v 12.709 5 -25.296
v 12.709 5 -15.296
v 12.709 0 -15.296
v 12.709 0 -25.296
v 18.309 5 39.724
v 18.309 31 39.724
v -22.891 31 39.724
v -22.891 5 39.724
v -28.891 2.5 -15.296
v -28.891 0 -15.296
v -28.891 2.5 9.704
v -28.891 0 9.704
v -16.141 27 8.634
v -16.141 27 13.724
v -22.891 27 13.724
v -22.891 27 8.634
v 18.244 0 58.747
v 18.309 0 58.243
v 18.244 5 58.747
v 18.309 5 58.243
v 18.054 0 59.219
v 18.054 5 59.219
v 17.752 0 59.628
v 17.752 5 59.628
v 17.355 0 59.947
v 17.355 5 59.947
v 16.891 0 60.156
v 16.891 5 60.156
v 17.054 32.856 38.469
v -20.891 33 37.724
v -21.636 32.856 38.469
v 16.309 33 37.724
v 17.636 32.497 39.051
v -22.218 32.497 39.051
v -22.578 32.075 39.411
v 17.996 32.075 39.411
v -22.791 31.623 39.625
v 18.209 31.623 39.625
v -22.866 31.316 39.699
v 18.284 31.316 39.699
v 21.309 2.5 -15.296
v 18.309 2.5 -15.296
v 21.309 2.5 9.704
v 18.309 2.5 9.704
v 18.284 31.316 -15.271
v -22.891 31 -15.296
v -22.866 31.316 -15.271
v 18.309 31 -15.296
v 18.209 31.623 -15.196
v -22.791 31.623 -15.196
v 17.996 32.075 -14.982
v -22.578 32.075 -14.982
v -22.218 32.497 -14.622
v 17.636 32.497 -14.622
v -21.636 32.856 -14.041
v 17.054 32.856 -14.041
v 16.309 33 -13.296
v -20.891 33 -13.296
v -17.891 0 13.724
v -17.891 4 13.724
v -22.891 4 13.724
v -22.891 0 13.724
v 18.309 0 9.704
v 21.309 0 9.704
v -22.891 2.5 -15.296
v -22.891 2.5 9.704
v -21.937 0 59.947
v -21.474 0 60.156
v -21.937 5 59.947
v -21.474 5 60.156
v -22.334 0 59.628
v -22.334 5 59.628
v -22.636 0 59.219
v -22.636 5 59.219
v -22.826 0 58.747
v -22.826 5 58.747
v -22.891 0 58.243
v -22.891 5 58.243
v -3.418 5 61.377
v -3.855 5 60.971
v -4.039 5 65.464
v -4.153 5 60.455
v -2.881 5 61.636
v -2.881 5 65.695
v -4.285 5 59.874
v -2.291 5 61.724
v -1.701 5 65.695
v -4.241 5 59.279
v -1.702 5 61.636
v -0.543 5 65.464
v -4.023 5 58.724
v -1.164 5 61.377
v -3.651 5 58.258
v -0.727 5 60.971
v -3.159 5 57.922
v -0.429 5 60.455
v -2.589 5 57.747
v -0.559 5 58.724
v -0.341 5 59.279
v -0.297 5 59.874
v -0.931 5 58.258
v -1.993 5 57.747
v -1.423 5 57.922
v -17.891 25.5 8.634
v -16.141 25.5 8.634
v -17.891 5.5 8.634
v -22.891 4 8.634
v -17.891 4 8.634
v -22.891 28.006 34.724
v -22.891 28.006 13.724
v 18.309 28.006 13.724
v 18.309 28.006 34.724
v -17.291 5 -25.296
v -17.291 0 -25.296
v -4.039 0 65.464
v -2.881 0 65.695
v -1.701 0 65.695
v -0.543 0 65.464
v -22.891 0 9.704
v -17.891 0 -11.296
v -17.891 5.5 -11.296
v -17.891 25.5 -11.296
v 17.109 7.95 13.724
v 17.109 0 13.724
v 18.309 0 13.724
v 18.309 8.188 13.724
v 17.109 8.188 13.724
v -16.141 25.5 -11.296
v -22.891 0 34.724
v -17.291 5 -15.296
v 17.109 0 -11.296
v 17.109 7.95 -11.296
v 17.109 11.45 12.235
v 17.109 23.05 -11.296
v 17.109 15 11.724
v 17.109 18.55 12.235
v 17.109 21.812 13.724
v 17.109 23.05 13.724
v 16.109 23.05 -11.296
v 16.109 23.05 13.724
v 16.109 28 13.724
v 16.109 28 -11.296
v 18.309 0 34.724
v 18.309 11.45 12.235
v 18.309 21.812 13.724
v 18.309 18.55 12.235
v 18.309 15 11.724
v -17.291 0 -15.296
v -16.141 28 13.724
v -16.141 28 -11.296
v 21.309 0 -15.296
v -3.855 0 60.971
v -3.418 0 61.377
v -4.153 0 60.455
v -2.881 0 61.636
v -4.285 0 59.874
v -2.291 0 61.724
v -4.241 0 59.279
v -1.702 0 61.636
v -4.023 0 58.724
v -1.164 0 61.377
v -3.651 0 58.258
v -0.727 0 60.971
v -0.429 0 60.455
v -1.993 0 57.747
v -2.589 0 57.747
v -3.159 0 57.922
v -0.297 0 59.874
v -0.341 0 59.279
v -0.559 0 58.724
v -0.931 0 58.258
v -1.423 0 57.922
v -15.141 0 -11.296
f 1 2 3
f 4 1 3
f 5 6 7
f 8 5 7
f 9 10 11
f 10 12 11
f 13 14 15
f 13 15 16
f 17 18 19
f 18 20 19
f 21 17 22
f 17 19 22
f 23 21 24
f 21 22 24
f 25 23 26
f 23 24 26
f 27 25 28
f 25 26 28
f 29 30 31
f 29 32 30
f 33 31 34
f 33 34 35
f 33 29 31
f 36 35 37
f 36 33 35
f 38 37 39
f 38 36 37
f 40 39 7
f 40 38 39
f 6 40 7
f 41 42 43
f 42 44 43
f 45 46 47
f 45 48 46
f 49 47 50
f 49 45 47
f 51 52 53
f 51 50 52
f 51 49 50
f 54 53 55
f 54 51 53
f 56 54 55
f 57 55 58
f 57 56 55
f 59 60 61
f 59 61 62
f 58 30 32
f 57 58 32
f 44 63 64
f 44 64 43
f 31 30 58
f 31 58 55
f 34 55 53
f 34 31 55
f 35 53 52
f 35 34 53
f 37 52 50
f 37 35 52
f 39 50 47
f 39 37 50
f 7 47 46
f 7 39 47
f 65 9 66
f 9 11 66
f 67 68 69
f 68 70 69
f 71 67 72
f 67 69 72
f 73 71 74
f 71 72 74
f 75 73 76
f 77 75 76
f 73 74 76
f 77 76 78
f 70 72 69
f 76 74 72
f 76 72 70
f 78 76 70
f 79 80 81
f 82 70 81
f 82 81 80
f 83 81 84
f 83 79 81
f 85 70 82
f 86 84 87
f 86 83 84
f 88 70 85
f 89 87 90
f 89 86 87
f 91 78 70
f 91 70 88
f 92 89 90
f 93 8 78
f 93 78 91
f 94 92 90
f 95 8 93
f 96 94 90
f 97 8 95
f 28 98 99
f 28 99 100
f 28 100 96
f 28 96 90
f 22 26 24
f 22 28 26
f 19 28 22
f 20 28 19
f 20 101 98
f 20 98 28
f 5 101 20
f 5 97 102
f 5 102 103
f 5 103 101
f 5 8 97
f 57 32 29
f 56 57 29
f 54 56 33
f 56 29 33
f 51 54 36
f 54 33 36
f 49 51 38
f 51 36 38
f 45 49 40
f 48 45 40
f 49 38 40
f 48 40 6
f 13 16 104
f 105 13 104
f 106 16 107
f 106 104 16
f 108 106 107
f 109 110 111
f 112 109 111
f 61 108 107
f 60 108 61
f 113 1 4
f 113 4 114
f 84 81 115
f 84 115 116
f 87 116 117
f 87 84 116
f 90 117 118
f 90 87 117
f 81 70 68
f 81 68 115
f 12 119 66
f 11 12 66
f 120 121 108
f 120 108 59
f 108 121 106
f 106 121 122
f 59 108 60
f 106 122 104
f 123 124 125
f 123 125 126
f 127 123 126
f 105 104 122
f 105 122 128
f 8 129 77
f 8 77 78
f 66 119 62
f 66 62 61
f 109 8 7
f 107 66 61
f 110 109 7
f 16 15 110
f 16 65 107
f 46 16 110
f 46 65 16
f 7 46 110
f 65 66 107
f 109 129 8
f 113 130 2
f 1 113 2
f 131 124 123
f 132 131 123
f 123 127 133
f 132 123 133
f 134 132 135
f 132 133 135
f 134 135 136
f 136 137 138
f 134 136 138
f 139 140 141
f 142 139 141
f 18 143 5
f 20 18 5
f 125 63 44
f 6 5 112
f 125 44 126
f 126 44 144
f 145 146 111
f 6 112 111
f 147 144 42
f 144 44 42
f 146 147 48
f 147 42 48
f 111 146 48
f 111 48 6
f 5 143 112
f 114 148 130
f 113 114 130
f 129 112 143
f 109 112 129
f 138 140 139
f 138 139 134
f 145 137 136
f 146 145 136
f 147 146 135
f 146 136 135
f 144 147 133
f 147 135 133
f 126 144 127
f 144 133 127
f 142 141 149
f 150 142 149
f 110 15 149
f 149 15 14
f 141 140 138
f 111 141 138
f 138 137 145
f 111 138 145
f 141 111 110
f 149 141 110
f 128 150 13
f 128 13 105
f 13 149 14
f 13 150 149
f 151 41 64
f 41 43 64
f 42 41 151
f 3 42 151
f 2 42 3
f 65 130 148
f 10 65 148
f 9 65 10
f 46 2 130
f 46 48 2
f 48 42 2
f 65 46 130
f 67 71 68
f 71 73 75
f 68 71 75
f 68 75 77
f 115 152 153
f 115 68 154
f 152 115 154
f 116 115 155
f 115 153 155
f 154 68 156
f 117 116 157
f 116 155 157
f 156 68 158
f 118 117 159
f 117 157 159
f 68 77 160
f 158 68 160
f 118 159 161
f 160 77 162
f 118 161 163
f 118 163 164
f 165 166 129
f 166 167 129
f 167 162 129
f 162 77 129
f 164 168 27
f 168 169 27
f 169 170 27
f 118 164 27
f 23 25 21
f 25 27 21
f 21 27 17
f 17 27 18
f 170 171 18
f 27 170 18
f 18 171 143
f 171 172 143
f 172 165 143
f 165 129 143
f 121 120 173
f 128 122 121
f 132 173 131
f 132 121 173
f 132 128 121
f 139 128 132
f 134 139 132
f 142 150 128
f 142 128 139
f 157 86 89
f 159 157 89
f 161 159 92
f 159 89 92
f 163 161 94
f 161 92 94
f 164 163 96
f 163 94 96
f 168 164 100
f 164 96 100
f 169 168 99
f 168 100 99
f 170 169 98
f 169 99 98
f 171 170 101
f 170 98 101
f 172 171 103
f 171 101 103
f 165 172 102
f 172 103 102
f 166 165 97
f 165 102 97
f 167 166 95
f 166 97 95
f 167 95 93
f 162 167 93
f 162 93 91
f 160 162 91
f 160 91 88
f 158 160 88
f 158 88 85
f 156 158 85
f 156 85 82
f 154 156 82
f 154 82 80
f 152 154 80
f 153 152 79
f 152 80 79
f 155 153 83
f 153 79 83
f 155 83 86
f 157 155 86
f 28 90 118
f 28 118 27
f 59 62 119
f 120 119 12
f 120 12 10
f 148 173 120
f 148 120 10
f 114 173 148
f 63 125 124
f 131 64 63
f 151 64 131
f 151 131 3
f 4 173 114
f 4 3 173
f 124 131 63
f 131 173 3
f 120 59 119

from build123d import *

# Parameters (mm, degrees)
SKETCH1_W            = 39
SKETCH1_H            = 49.22
BOSS_EXTRUDE2_DEPTH  = 30
SKETCH3_W            = 1.75
SKETCH3_H            = 20
SKETCH3_W_2          = 1
SKETCH3_H_2          = 15.1
CUT_EXTRUDE3_DEPTH   = 47.22
CUT_EXTRUDE4_DEPTH   = 47.22
CUT_EXTRUDE5_DEPTH   = 3.75
SKETCH9_W            = 22.2
SKETCH9_H            = 30
CUT_EXTRUDE7_DEPTH   = 61.922592565
SKETCH11_W           = 0.8
SKETCH11_H           = 21.811754546
SKETCH11_H_2         = 8.188245454
CUT_EXTRUDE8_DEPTH   = 46.008146799
SKETCH12_W           = 23
SKETCH12_H           = 2.5
BOSS_EXTRUDE3_DEPTH  = 3
SKETCH13_W           = 23
SKETCH13_H           = 2.5
BOSS_EXTRUDE4_DEPTH  = 3
BOSS_EXTRUDE5_REACH  = 51.909
SKETCH14_W           = 27.02
SKETCH14_H           = 3
SKETCH15_W           = 30.25
SKETCH15_H           = 3
CUT_EXTRUDE9_DEPTH   = 25.02
SKETCH16_W           = 30.25
SKETCH16_H           = 3
CUT_EXTRUDE10_DEPTH  = 46.276919382
SKETCH24_W           = 23
SKETCH24_H           = 2.5
BOSS_EXTRUDE8_DEPTH  = 6
BOSS_EXTRUDE9_DEPTH  = 3
SKETCH26_W           = 41.2
SKETCH26_H           = 27.02
BOSS_EXTRUDE10_DEPTH = 3
SKETCH29_W           = 4.264424859
SKETCH29_H           = 26.447816837
CUT_EXTRUDE14_DEPTH  = 41.905994632
SKETCH30_W           = 3.981396999
SKETCH30_H           = 33.655588154
CUT_EXTRUDE15_DEPTH  = 40.425282457
BOSS_EXTRUDE15_DEPTH = 2
BOSS_EXTRUDE16_DEPTH = 2
SKETCH36_W           = 41.2
SKETCH36_H           = 4.993514727
BOSS_EXTRUDE17_DEPTH = 26
SKETCH37_W           = 41.2
SKETCH37_H           = 5
BOSS_EXTRUDE18_DEPTH = 28.006485273
SKETCH38_W           = 41.2
SKETCH38_H           = 5
BOSS_EXTRUDE19_DEPTH = 20
BOSS_EXTRUDE21_DEPTH = 5
SKETCH40_R           = 2
CUT_EXTRUDE16_DEPTH  = 78.060934741
FILLET1_R            = 2
BOSS_EXTRUDE22_DEPTH = 10


with BuildPart() as part:
    # Sketch1 → Boss-Extrude2 (new body)
    with BuildSketch(Plane(origin=(0, 0, 0), x_dir=(1, 0, 0), z_dir=(0, 1, 0))):
        with Locations((-0.391025069, -11.314396792)):
            Rectangle(SKETCH1_W, SKETCH1_H)
    extrude(amount=BOSS_EXTRUDE2_DEPTH)

    # Sketch3 → Cut-Extrude3 (cut)
    with BuildSketch(Plane.XY.offset(35.924396792)):
        Polygon((16.108974931, 23.05), (16.108974931, 28), (-16.141025069, 28), (-16.141025069, 25.5), (-16.141025069, 5.5), (-16.141025069, 0), (16.108974931, 0), (16.108974931, 7.95), align=None)
        with Locations((-17.016025069, 15.5)):
            Rectangle(SKETCH3_W, SKETCH3_H)
        with Locations((16.608974931, 15.5)):
            Rectangle(SKETCH3_W_2, SKETCH3_H_2)
    extrude(amount=-CUT_EXTRUDE3_DEPTH, mode=Mode.SUBTRACT)

    # Sketch7 → Cut-Extrude4 (cut)
    with BuildSketch(Plane.ZY.offset(19.891025069)):
        with BuildLine():
            ThreePointArc((11.724396792, 15), (24.324396792, 2.4), (36.924396792, 15))
            ThreePointArc((36.924396792, 15), (24.324396792, 27.6), (11.724396792, 15))
        make_face()
    extrude(amount=-CUT_EXTRUDE4_DEPTH, mode=Mode.SUBTRACT)

    # Sketch8 → Cut-Extrude5 (cut)
    with BuildSketch(Plane.ZY.offset(19.891025069)):
        with BuildLine():
            Line((35.924396792, 30), (17.633933867, 30))
            Line((17.633933867, 30), (17.633933867, 27))
            Line((17.633933867, 27), (8.633933867, 27))
            Line((8.633933867, 27), (8.633933867, 4))
            Line((8.633933867, 4), (17.633933867, 4))
            Line((17.633933867, 4), (17.633933867, 0))
            Line((17.633933867, 0), (35.924396792, 0))
            Line((35.924396792, 0), (35.924396792, 10.08065045))
            ThreePointArc((35.924396792, 10.08065045), (11.724396792, 15), (35.924396792, 19.91934955))
            Line((35.924396792, 19.91934955), (35.924396792, 30))
        make_face()
    extrude(amount=-CUT_EXTRUDE5_DEPTH, mode=Mode.SUBTRACT)

    # Sketch9 → Cut-Extrude7 (cut, through all)
    with BuildSketch(Plane(origin=(19.108974931, 0, 0), x_dir=(0, 0, -1), z_dir=(1, 0, 0))):
        with Locations((-24.824396792, 15)):
            Rectangle(SKETCH9_W, SKETCH9_H)
    extrude(amount=-CUT_EXTRUDE7_DEPTH, mode=Mode.SUBTRACT)

    # Sketch11 → Cut-Extrude8 (cut, through all)
    with BuildSketch(Plane.XY.offset(13.724396792)):
        with Locations((18.708974931, 19.094122727)):
            Rectangle(SKETCH11_W, SKETCH11_H)
        with Locations((18.708974931, 4.094122727)):
            Rectangle(SKETCH11_W, SKETCH11_H_2)
    extrude(amount=-CUT_EXTRUDE8_DEPTH, mode=Mode.SUBTRACT)

    # Sketch12 → Boss-Extrude3 (add)
    with BuildSketch(Plane(origin=(18.308974931, 0, 0), x_dir=(0, 0, -1), z_dir=(1, 0, 0))):
        with Locations((1.795603208, 1.25)):
            Rectangle(SKETCH12_W, SKETCH12_H)
    extrude(amount=BOSS_EXTRUDE3_DEPTH)

    # Sketch13 → Boss-Extrude4 (add)
    with BuildSketch(Plane.ZY.offset(19.891025069)):
        with Locations((-1.795603208, 1.25)):
            Rectangle(SKETCH13_W, SKETCH13_H)
    extrude(amount=BOSS_EXTRUDE4_DEPTH)

    # Sketch14 → Boss-Extrude5 (add, up to next)
    with BuildSketch(Plane(origin=(-16.141025069, 0, 0), x_dir=(0, 0, -1), z_dir=(1, 0, 0)), mode=Mode.PRIVATE) as boss_extrude5_sk1:
        with Locations((-0.214396792, 1.5)):
            Rectangle(SKETCH14_W, SKETCH14_H)
    boss_extrude5_tool1 = extrude(boss_extrude5_sk1.sketch, amount=BOSS_EXTRUDE5_REACH, mode=Mode.PRIVATE) - part.part
    add(boss_extrude5_tool1.solids().sort_by_distance((-16.141025, 1.5, 0.214397))[0])

    # Sketch15 → Cut-Extrude9 (cut)
    with BuildSketch(Plane.XY.offset(13.724396792)):
        with Locations((-0.016025069, 1.5)):
            Rectangle(SKETCH15_W, SKETCH15_H)
    extrude(amount=-CUT_EXTRUDE9_DEPTH, mode=Mode.SUBTRACT)

    # Sketch16 → Cut-Extrude10 (cut, through all)
    with BuildSketch(Plane.XY.offset(-11.295603208)):
        with Locations((-0.016025069, 1.5)):
            Rectangle(SKETCH16_W, SKETCH16_H)
    extrude(amount=-CUT_EXTRUDE10_DEPTH, mode=Mode.SUBTRACT)

    # Sketch24 → Boss-Extrude8 (add)
    with BuildSketch(Plane.ZY.offset(22.891025069)):
        with Locations((-1.795603208, 1.25)):
            Rectangle(SKETCH24_W, SKETCH24_H)
    extrude(amount=BOSS_EXTRUDE8_DEPTH)

    # Sketch25 → Boss-Extrude9 (add)
    with BuildSketch(Plane.ZY.offset(19.891025069)):
        Polygon((-13.295603208, 30), (13.724396792, 30), (13.724396792, 27), (8.633933867, 27), (8.633933867, 4), (13.724396792, 4), (13.724396792, 0), (9.704396792, 0), (9.704396792, 2.5), (-13.295603208, 2.5), align=None)
    extrude(amount=BOSS_EXTRUDE9_DEPTH)

    # Sketch26 → Boss-Extrude10 (add)
    with BuildSketch(Plane(origin=(0, 30, 0), x_dir=(1, 0, 0), z_dir=(0, 1, 0))):
        with Locations((-2.291025069, -0.214396792)):
            Rectangle(SKETCH26_W, SKETCH26_H)
    extrude(amount=BOSS_EXTRUDE10_DEPTH)

    # Sketch29 → Cut-Extrude14 (cut, through all)
    with BuildSketch(Plane.XZ.offset(-25.5)):
        with Locations((-15.75881264, 1.92830521)):
            Rectangle(SKETCH29_W, SKETCH29_H)
    extrude(amount=CUT_EXTRUDE14_DEPTH, mode=Mode.SUBTRACT)

    # Sketch30 → Cut-Extrude15 (cut, through all)
    with BuildSketch(Plane(origin=(0, 23.05, 0), x_dir=(-1, 0, 0), z_dir=(0, -1, 0))):
        with Locations((-15.118276432, -5.532190869)):
            Rectangle(SKETCH30_W, SKETCH30_H)
    extrude(amount=CUT_EXTRUDE15_DEPTH, mode=Mode.SUBTRACT)

    # Sketch34 → Boss-Extrude15 (add)
    with BuildSketch(Plane(origin=(0, 0, -13.295603208), x_dir=(-1, 0, 0), z_dir=(0, 0, -1))):
        Polygon((-18.308974931, 33), (-18.308974931, 2.5), (-21.308974931, 2.5), (-21.308974931, 0), (28.891025069, 0), (28.891025069, 2.5), (22.891025069, 2.5), (22.891025069, 33), align=None)
    extrude(amount=-BOSS_EXTRUDE15_DEPTH)

    # Sketch35 → Boss-Extrude16 (add)
    with BuildSketch(Plane(origin=(0, 0, -13.295603208), x_dir=(-1, 0, 0), z_dir=(0, 0, -1))):
        Polygon((-18.308974931, 33), (-18.308974931, 2.5), (-21.308974931, 2.5), (-21.308974931, 0), (28.891025069, 0), (28.891025069, 2.5), (22.891025069, 2.5), (22.891025069, 33), align=None)
    extrude(amount=BOSS_EXTRUDE16_DEPTH)

    # Sketch36 → Boss-Extrude17 (add)
    with BuildSketch(Plane.XY.offset(13.724396792)):
        with Locations((-2.291025069, 30.503242637)):
            Rectangle(SKETCH36_W, SKETCH36_H)
    extrude(amount=BOSS_EXTRUDE17_DEPTH)

    # Sketch37 → Boss-Extrude18 (add)
    with BuildSketch(Plane(origin=(0, 28.006485273, 0), x_dir=(-1, 0, 0), z_dir=(0, -1, 0))):
        with Locations((2.291025069, -37.224396792)):
            Rectangle(SKETCH37_W, SKETCH37_H)
    extrude(amount=BOSS_EXTRUDE18_DEPTH)

    # Sketch38 → Boss-Extrude19 (add)
    with BuildSketch(Plane.XY.offset(39.724396792)):
        with Locations((-2.291025069, 2.5)):
            Rectangle(SKETCH38_W, SKETCH38_H)
    extrude(amount=BOSS_EXTRUDE19_DEPTH)

    # Sketch39 → Boss-Extrude21 (add)
    with BuildSketch(Plane(origin=(0, 5, 0), x_dir=(1, 0, 0), z_dir=(0, 1, 0))):
        with BuildLine():
            Line((-8.291025069, -59.724396792), (-22.891025069, -59.724396792))
            Line((-22.891025069, -59.724396792), (-4.038597885, -65.464256481))
            ThreePointArc((-4.038597885, -65.464256481), (-7.112095329, -63.296130482), (-8.291025069, -59.724396792))
        make_face()
        with BuildLine():
            ThreePointArc((-8.291025069, -59.724396792), (-7.112095329, -63.296130482), (-4.038597885, -65.464256481))
            ThreePointArc((-4.038597885, -65.464256481), (-2.291025069, -65.724396792), (-0.543452254, -65.464256481))
            ThreePointArc((-0.543452254, -65.464256481), (2.53004519, -63.296130482), (3.708974931, -59.724396792))
            Line((3.708974931, -59.724396792), (-0.291025069, -59.724396792))
            ThreePointArc((-0.291025069, -59.724396792), (-2.291025069, -61.724396792), (-4.291025069, -59.724396792))
            Line((-4.291025069, -59.724396792), (-8.291025069, -59.724396792))
        make_face()
        with BuildLine():
            ThreePointArc((3.708974931, -59.724396792), (-2.291025069, -53.724396792), (-8.291025069, -59.724396792))
            Line((-8.291025069, -59.724396792), (-4.291025069, -59.724396792))
            ThreePointArc((-4.291025069, -59.724396792), (-2.291025069, -57.724396792), (-0.291025069, -59.724396792))
            Line((-0.291025069, -59.724396792), (3.708974931, -59.724396792))
        make_face()
        with BuildLine():
            ThreePointArc((3.708974931, -59.724396792), (2.53004519, -63.296130482), (-0.543452254, -65.464256481))
            Line((-0.543452254, -65.464256481), (18.308974931, -59.724396792))
            Line((18.308974931, -59.724396792), (3.708974931, -59.724396792))
        make_face()
    extrude(amount=-BOSS_EXTRUDE21_DEPTH)

    # Sketch40 → Cut-Extrude16 (cut, through all)
    with BuildSketch(Plane(origin=(0, 5, 0), x_dir=(1, 0, 0), z_dir=(0, 1, 0))):
        with Locations(Location((-2.291025069, -59.724396792, 0), (0, 0, 270))):
            Circle(SKETCH40_R)
    extrude(amount=-CUT_EXTRUDE16_DEPTH, mode=Mode.SUBTRACT)

    # Fillet1
    fillet1_edges = [part.edges().sort_by_distance(p)[0] for p in [
        (-22.891025069, 33, 12.214396792),
        (18.308974931, 33, 12.214396792),
        (-2.291025069, 33, -15.295603208),
        (-2.291025069, 33, 39.724396792),
        (-22.891025069, 2.5, 59.724396792),
        (18.308974931, 2.5, 59.724396792),
    ]]
    fillet(fillet1_edges, radius=FILLET1_R)

    # Sketch41 → Boss-Extrude22 (add)
    with BuildSketch(Plane(origin=(0, 0, -15.295603208), x_dir=(-1, 0, 0), z_dir=(0, 0, -1))):
        Polygon((17.291025069, 5), (2.291025069, 5), (-12.708974931, 5), (-12.708974931, 0), (2.291025069, 0), (17.291025069, 0), align=None)
    extrude(amount=BOSS_EXTRUDE22_DEPTH)


solid = part.part
